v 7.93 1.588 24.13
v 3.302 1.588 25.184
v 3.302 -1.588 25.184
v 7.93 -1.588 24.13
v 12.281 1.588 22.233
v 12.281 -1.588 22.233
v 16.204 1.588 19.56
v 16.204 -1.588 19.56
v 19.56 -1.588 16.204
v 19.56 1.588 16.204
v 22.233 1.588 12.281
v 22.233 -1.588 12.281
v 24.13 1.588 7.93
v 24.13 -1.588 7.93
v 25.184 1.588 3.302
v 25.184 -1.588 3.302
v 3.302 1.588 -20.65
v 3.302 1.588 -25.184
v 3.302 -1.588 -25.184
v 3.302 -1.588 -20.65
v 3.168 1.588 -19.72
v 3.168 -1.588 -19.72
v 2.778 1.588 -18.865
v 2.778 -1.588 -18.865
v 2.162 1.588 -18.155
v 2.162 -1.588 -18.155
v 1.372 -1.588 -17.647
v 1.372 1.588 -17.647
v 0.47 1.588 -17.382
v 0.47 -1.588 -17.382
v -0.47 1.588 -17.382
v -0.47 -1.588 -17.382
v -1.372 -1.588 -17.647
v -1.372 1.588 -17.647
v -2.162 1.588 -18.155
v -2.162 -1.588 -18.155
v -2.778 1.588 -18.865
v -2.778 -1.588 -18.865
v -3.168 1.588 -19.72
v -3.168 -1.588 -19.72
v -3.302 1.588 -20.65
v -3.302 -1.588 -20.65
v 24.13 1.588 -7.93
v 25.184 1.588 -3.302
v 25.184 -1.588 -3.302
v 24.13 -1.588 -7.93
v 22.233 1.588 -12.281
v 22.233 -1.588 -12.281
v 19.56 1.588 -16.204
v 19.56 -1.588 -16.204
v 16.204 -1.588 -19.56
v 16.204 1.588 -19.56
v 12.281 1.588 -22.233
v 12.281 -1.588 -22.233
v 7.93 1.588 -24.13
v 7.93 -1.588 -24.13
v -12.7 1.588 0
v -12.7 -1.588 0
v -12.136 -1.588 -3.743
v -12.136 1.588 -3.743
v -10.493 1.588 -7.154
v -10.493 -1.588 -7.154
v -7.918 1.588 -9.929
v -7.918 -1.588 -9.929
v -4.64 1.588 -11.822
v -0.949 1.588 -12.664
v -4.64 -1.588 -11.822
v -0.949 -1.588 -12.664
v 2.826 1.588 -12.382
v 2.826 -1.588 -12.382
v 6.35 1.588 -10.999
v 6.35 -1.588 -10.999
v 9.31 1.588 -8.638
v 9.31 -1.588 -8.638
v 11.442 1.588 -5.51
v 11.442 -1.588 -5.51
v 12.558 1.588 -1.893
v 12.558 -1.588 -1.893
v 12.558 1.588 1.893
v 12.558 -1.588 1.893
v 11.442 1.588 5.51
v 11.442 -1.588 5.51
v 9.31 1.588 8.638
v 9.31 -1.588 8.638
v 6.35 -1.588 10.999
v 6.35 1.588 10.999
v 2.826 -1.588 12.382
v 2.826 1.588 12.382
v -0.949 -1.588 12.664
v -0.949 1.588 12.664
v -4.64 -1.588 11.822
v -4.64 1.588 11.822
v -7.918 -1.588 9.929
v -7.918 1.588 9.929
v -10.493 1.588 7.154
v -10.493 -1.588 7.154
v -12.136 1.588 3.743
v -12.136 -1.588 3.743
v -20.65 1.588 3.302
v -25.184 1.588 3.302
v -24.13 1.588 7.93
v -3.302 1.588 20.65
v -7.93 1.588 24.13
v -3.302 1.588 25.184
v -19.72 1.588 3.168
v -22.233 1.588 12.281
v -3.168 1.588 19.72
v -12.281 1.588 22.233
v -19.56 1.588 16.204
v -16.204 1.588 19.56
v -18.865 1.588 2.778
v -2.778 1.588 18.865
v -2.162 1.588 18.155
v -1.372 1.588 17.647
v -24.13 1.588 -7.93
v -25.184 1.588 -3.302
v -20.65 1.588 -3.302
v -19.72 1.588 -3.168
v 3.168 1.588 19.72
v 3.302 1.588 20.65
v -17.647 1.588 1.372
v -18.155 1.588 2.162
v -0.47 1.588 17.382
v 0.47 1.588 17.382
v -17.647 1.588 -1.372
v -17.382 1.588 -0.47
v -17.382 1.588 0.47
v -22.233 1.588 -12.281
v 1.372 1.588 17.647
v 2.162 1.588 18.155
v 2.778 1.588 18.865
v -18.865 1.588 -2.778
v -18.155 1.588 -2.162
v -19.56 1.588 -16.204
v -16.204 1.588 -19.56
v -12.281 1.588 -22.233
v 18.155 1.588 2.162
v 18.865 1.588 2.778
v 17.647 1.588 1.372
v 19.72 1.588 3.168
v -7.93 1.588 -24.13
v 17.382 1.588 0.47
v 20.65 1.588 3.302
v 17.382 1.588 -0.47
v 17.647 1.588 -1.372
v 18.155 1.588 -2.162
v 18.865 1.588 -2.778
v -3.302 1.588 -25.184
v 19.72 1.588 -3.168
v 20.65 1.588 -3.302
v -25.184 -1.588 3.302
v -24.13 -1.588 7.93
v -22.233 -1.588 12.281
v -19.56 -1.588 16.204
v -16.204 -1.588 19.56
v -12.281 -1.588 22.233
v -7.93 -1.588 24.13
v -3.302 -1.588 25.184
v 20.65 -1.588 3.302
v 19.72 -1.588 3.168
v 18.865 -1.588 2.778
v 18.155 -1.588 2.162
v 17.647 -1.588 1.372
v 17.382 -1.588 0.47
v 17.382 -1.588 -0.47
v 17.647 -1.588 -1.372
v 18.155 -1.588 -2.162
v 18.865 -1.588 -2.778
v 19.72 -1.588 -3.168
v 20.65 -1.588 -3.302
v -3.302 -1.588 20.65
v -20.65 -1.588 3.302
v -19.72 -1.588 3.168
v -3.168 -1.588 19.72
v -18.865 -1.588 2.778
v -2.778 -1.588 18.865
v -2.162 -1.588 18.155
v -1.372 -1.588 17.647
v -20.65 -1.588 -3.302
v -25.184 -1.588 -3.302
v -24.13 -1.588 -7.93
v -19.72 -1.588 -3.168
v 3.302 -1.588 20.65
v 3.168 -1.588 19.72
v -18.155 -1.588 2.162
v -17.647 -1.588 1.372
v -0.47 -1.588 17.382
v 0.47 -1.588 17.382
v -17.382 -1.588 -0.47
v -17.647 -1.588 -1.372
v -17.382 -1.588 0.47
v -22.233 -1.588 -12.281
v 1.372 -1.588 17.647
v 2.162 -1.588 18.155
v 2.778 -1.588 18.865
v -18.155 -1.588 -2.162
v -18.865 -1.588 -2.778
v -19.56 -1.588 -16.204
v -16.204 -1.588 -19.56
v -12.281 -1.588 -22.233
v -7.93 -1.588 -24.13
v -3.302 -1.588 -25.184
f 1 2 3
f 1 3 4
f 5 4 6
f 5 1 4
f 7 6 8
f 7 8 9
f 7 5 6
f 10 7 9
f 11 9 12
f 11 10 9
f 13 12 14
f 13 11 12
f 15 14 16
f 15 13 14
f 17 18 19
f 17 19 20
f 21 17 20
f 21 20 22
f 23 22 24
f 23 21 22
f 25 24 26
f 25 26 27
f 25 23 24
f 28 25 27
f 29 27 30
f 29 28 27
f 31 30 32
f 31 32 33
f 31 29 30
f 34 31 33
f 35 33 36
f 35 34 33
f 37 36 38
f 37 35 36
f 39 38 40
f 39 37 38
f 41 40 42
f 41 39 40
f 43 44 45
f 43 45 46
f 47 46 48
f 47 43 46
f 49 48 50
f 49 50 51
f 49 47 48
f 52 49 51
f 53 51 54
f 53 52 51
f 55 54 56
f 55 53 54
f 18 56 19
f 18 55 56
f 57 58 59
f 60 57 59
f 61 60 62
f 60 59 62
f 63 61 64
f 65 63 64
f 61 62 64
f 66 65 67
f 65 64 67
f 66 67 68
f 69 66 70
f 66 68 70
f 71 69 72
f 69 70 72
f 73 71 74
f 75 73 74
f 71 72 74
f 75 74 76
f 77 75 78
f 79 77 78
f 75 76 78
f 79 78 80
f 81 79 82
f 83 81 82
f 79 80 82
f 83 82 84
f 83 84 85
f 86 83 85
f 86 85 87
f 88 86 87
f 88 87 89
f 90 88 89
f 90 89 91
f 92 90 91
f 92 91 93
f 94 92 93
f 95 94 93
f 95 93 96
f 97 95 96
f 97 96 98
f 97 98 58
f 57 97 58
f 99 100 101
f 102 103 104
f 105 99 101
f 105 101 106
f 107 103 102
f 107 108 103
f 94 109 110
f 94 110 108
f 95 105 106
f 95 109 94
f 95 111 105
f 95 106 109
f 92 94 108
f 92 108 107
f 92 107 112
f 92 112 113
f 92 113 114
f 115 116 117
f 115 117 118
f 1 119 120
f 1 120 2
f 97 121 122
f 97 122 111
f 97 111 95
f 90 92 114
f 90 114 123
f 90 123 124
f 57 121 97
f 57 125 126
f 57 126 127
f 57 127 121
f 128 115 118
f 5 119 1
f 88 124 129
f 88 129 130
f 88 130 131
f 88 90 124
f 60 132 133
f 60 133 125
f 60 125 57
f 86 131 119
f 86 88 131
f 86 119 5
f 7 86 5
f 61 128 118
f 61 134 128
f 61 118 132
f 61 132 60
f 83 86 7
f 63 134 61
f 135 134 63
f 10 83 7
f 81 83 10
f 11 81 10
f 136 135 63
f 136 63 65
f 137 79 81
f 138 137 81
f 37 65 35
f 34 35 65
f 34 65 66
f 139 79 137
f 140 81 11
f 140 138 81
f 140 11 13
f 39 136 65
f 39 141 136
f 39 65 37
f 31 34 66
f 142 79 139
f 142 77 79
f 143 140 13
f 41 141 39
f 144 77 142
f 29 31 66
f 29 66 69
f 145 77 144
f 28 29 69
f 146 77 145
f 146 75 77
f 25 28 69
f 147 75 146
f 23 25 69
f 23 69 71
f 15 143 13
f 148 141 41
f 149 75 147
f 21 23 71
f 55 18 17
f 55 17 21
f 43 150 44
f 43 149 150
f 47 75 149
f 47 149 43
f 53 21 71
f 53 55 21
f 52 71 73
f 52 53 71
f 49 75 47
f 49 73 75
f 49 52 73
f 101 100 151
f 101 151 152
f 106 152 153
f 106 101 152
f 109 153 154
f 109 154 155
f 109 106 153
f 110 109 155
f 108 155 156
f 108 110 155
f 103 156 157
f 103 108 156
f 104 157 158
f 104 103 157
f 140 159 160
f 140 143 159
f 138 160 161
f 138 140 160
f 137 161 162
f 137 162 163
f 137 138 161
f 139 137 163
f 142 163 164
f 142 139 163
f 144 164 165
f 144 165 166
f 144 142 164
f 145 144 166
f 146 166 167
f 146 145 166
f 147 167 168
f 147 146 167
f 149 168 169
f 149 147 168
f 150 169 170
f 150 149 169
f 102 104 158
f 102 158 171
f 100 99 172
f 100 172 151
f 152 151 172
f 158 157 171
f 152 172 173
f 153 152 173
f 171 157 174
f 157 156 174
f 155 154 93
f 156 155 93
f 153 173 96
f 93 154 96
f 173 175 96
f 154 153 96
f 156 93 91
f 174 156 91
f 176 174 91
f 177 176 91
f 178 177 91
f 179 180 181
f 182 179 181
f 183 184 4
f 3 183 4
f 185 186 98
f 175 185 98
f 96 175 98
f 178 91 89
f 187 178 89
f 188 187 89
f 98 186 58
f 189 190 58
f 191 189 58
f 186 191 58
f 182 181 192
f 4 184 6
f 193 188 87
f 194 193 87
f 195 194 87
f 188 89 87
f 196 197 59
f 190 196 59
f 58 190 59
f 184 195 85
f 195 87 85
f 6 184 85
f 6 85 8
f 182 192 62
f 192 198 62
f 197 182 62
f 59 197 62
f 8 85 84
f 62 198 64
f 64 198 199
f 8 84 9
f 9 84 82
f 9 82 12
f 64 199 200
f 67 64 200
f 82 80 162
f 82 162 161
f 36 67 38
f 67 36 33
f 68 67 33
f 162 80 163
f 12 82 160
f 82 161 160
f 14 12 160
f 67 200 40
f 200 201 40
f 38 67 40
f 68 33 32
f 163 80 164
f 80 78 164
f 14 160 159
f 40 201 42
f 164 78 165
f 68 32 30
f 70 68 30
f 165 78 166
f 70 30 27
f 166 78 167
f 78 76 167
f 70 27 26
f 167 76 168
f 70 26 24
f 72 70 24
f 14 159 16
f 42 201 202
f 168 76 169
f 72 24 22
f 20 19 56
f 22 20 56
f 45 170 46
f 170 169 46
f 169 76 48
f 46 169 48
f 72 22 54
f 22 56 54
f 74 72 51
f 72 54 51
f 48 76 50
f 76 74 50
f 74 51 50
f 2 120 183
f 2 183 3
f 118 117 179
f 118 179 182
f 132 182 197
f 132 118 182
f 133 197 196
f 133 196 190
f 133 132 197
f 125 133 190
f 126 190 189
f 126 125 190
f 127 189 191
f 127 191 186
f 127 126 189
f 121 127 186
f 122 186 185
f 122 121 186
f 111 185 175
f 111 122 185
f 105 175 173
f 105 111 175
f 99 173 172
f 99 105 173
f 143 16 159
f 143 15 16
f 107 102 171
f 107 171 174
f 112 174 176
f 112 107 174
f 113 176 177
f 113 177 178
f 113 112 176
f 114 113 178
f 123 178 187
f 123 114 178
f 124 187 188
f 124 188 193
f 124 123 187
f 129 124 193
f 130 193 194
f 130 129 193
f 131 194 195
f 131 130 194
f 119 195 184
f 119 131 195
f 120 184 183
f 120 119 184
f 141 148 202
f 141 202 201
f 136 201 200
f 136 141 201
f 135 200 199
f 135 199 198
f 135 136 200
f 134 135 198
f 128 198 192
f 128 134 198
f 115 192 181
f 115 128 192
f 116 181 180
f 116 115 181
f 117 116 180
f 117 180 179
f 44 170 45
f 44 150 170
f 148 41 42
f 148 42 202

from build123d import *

# Parameters (mm, degrees)
BOSS_EXTRUDE1_DEPTH = 1.5875
HOLE1_D             = 25.4


with BuildPart() as part:
    # Sketch2 → Boss-Extrude1 (new, symmetric)
    with BuildSketch(Plane(origin=(0, 0, 0), x_dir=(1, 0, 0), z_dir=(0, 1, 0))):
        with BuildLine():
            Line((20.6502, 3.302), (25.184455444, 3.302))
            ThreePointArc((25.184455444, 3.302), (17.960512242, 17.960512242), (3.302, 25.184455444))
            Line((3.302, 25.184455444), (3.302, 20.6502))
            ThreePointArc((3.302, 20.6502), (0, 17.3482), (-3.302, 20.6502))
            Line((-3.302, 20.6502), (-3.302, 25.184455444))
            ThreePointArc((-3.302, 25.184455444), (-17.960512242, 17.960512242), (-25.184455444, 3.302))
            Line((-25.184455444, 3.302), (-20.6502, 3.302))
            ThreePointArc((-20.6502, 3.302), (-17.3482, 0), (-20.6502, -3.302))
            Line((-20.6502, -3.302), (-25.184455444, -3.302))
            ThreePointArc((-25.184455444, -3.302), (-17.960512242, -17.960512242), (-3.302, -25.184455444))
            Line((-3.302, -25.184455444), (-3.302, -20.6502))
            ThreePointArc((-3.302, -20.6502), (0, -17.3482), (3.302, -20.6502))
            Line((3.302, -20.6502), (3.302, -25.184455444))
            ThreePointArc((3.302, -25.184455444), (17.960512242, -17.960512242), (25.184455444, -3.302))
            Line((25.184455444, -3.302), (20.6502, -3.302))
            ThreePointArc((20.6502, -3.302), (17.3482, 0), (20.6502, 3.302))
        make_face()
    extrude(amount=BOSS_EXTRUDE1_DEPTH, both=True)

    # Hole1 (through all)
    with Locations(Plane(origin=(0, 1.5875, 0), x_dir=(1, 0, 0), z_dir=(0, 1, 0))):
        with Locations((0, 0)):
            Hole(HOLE1_D / 2)


solid = part.part
